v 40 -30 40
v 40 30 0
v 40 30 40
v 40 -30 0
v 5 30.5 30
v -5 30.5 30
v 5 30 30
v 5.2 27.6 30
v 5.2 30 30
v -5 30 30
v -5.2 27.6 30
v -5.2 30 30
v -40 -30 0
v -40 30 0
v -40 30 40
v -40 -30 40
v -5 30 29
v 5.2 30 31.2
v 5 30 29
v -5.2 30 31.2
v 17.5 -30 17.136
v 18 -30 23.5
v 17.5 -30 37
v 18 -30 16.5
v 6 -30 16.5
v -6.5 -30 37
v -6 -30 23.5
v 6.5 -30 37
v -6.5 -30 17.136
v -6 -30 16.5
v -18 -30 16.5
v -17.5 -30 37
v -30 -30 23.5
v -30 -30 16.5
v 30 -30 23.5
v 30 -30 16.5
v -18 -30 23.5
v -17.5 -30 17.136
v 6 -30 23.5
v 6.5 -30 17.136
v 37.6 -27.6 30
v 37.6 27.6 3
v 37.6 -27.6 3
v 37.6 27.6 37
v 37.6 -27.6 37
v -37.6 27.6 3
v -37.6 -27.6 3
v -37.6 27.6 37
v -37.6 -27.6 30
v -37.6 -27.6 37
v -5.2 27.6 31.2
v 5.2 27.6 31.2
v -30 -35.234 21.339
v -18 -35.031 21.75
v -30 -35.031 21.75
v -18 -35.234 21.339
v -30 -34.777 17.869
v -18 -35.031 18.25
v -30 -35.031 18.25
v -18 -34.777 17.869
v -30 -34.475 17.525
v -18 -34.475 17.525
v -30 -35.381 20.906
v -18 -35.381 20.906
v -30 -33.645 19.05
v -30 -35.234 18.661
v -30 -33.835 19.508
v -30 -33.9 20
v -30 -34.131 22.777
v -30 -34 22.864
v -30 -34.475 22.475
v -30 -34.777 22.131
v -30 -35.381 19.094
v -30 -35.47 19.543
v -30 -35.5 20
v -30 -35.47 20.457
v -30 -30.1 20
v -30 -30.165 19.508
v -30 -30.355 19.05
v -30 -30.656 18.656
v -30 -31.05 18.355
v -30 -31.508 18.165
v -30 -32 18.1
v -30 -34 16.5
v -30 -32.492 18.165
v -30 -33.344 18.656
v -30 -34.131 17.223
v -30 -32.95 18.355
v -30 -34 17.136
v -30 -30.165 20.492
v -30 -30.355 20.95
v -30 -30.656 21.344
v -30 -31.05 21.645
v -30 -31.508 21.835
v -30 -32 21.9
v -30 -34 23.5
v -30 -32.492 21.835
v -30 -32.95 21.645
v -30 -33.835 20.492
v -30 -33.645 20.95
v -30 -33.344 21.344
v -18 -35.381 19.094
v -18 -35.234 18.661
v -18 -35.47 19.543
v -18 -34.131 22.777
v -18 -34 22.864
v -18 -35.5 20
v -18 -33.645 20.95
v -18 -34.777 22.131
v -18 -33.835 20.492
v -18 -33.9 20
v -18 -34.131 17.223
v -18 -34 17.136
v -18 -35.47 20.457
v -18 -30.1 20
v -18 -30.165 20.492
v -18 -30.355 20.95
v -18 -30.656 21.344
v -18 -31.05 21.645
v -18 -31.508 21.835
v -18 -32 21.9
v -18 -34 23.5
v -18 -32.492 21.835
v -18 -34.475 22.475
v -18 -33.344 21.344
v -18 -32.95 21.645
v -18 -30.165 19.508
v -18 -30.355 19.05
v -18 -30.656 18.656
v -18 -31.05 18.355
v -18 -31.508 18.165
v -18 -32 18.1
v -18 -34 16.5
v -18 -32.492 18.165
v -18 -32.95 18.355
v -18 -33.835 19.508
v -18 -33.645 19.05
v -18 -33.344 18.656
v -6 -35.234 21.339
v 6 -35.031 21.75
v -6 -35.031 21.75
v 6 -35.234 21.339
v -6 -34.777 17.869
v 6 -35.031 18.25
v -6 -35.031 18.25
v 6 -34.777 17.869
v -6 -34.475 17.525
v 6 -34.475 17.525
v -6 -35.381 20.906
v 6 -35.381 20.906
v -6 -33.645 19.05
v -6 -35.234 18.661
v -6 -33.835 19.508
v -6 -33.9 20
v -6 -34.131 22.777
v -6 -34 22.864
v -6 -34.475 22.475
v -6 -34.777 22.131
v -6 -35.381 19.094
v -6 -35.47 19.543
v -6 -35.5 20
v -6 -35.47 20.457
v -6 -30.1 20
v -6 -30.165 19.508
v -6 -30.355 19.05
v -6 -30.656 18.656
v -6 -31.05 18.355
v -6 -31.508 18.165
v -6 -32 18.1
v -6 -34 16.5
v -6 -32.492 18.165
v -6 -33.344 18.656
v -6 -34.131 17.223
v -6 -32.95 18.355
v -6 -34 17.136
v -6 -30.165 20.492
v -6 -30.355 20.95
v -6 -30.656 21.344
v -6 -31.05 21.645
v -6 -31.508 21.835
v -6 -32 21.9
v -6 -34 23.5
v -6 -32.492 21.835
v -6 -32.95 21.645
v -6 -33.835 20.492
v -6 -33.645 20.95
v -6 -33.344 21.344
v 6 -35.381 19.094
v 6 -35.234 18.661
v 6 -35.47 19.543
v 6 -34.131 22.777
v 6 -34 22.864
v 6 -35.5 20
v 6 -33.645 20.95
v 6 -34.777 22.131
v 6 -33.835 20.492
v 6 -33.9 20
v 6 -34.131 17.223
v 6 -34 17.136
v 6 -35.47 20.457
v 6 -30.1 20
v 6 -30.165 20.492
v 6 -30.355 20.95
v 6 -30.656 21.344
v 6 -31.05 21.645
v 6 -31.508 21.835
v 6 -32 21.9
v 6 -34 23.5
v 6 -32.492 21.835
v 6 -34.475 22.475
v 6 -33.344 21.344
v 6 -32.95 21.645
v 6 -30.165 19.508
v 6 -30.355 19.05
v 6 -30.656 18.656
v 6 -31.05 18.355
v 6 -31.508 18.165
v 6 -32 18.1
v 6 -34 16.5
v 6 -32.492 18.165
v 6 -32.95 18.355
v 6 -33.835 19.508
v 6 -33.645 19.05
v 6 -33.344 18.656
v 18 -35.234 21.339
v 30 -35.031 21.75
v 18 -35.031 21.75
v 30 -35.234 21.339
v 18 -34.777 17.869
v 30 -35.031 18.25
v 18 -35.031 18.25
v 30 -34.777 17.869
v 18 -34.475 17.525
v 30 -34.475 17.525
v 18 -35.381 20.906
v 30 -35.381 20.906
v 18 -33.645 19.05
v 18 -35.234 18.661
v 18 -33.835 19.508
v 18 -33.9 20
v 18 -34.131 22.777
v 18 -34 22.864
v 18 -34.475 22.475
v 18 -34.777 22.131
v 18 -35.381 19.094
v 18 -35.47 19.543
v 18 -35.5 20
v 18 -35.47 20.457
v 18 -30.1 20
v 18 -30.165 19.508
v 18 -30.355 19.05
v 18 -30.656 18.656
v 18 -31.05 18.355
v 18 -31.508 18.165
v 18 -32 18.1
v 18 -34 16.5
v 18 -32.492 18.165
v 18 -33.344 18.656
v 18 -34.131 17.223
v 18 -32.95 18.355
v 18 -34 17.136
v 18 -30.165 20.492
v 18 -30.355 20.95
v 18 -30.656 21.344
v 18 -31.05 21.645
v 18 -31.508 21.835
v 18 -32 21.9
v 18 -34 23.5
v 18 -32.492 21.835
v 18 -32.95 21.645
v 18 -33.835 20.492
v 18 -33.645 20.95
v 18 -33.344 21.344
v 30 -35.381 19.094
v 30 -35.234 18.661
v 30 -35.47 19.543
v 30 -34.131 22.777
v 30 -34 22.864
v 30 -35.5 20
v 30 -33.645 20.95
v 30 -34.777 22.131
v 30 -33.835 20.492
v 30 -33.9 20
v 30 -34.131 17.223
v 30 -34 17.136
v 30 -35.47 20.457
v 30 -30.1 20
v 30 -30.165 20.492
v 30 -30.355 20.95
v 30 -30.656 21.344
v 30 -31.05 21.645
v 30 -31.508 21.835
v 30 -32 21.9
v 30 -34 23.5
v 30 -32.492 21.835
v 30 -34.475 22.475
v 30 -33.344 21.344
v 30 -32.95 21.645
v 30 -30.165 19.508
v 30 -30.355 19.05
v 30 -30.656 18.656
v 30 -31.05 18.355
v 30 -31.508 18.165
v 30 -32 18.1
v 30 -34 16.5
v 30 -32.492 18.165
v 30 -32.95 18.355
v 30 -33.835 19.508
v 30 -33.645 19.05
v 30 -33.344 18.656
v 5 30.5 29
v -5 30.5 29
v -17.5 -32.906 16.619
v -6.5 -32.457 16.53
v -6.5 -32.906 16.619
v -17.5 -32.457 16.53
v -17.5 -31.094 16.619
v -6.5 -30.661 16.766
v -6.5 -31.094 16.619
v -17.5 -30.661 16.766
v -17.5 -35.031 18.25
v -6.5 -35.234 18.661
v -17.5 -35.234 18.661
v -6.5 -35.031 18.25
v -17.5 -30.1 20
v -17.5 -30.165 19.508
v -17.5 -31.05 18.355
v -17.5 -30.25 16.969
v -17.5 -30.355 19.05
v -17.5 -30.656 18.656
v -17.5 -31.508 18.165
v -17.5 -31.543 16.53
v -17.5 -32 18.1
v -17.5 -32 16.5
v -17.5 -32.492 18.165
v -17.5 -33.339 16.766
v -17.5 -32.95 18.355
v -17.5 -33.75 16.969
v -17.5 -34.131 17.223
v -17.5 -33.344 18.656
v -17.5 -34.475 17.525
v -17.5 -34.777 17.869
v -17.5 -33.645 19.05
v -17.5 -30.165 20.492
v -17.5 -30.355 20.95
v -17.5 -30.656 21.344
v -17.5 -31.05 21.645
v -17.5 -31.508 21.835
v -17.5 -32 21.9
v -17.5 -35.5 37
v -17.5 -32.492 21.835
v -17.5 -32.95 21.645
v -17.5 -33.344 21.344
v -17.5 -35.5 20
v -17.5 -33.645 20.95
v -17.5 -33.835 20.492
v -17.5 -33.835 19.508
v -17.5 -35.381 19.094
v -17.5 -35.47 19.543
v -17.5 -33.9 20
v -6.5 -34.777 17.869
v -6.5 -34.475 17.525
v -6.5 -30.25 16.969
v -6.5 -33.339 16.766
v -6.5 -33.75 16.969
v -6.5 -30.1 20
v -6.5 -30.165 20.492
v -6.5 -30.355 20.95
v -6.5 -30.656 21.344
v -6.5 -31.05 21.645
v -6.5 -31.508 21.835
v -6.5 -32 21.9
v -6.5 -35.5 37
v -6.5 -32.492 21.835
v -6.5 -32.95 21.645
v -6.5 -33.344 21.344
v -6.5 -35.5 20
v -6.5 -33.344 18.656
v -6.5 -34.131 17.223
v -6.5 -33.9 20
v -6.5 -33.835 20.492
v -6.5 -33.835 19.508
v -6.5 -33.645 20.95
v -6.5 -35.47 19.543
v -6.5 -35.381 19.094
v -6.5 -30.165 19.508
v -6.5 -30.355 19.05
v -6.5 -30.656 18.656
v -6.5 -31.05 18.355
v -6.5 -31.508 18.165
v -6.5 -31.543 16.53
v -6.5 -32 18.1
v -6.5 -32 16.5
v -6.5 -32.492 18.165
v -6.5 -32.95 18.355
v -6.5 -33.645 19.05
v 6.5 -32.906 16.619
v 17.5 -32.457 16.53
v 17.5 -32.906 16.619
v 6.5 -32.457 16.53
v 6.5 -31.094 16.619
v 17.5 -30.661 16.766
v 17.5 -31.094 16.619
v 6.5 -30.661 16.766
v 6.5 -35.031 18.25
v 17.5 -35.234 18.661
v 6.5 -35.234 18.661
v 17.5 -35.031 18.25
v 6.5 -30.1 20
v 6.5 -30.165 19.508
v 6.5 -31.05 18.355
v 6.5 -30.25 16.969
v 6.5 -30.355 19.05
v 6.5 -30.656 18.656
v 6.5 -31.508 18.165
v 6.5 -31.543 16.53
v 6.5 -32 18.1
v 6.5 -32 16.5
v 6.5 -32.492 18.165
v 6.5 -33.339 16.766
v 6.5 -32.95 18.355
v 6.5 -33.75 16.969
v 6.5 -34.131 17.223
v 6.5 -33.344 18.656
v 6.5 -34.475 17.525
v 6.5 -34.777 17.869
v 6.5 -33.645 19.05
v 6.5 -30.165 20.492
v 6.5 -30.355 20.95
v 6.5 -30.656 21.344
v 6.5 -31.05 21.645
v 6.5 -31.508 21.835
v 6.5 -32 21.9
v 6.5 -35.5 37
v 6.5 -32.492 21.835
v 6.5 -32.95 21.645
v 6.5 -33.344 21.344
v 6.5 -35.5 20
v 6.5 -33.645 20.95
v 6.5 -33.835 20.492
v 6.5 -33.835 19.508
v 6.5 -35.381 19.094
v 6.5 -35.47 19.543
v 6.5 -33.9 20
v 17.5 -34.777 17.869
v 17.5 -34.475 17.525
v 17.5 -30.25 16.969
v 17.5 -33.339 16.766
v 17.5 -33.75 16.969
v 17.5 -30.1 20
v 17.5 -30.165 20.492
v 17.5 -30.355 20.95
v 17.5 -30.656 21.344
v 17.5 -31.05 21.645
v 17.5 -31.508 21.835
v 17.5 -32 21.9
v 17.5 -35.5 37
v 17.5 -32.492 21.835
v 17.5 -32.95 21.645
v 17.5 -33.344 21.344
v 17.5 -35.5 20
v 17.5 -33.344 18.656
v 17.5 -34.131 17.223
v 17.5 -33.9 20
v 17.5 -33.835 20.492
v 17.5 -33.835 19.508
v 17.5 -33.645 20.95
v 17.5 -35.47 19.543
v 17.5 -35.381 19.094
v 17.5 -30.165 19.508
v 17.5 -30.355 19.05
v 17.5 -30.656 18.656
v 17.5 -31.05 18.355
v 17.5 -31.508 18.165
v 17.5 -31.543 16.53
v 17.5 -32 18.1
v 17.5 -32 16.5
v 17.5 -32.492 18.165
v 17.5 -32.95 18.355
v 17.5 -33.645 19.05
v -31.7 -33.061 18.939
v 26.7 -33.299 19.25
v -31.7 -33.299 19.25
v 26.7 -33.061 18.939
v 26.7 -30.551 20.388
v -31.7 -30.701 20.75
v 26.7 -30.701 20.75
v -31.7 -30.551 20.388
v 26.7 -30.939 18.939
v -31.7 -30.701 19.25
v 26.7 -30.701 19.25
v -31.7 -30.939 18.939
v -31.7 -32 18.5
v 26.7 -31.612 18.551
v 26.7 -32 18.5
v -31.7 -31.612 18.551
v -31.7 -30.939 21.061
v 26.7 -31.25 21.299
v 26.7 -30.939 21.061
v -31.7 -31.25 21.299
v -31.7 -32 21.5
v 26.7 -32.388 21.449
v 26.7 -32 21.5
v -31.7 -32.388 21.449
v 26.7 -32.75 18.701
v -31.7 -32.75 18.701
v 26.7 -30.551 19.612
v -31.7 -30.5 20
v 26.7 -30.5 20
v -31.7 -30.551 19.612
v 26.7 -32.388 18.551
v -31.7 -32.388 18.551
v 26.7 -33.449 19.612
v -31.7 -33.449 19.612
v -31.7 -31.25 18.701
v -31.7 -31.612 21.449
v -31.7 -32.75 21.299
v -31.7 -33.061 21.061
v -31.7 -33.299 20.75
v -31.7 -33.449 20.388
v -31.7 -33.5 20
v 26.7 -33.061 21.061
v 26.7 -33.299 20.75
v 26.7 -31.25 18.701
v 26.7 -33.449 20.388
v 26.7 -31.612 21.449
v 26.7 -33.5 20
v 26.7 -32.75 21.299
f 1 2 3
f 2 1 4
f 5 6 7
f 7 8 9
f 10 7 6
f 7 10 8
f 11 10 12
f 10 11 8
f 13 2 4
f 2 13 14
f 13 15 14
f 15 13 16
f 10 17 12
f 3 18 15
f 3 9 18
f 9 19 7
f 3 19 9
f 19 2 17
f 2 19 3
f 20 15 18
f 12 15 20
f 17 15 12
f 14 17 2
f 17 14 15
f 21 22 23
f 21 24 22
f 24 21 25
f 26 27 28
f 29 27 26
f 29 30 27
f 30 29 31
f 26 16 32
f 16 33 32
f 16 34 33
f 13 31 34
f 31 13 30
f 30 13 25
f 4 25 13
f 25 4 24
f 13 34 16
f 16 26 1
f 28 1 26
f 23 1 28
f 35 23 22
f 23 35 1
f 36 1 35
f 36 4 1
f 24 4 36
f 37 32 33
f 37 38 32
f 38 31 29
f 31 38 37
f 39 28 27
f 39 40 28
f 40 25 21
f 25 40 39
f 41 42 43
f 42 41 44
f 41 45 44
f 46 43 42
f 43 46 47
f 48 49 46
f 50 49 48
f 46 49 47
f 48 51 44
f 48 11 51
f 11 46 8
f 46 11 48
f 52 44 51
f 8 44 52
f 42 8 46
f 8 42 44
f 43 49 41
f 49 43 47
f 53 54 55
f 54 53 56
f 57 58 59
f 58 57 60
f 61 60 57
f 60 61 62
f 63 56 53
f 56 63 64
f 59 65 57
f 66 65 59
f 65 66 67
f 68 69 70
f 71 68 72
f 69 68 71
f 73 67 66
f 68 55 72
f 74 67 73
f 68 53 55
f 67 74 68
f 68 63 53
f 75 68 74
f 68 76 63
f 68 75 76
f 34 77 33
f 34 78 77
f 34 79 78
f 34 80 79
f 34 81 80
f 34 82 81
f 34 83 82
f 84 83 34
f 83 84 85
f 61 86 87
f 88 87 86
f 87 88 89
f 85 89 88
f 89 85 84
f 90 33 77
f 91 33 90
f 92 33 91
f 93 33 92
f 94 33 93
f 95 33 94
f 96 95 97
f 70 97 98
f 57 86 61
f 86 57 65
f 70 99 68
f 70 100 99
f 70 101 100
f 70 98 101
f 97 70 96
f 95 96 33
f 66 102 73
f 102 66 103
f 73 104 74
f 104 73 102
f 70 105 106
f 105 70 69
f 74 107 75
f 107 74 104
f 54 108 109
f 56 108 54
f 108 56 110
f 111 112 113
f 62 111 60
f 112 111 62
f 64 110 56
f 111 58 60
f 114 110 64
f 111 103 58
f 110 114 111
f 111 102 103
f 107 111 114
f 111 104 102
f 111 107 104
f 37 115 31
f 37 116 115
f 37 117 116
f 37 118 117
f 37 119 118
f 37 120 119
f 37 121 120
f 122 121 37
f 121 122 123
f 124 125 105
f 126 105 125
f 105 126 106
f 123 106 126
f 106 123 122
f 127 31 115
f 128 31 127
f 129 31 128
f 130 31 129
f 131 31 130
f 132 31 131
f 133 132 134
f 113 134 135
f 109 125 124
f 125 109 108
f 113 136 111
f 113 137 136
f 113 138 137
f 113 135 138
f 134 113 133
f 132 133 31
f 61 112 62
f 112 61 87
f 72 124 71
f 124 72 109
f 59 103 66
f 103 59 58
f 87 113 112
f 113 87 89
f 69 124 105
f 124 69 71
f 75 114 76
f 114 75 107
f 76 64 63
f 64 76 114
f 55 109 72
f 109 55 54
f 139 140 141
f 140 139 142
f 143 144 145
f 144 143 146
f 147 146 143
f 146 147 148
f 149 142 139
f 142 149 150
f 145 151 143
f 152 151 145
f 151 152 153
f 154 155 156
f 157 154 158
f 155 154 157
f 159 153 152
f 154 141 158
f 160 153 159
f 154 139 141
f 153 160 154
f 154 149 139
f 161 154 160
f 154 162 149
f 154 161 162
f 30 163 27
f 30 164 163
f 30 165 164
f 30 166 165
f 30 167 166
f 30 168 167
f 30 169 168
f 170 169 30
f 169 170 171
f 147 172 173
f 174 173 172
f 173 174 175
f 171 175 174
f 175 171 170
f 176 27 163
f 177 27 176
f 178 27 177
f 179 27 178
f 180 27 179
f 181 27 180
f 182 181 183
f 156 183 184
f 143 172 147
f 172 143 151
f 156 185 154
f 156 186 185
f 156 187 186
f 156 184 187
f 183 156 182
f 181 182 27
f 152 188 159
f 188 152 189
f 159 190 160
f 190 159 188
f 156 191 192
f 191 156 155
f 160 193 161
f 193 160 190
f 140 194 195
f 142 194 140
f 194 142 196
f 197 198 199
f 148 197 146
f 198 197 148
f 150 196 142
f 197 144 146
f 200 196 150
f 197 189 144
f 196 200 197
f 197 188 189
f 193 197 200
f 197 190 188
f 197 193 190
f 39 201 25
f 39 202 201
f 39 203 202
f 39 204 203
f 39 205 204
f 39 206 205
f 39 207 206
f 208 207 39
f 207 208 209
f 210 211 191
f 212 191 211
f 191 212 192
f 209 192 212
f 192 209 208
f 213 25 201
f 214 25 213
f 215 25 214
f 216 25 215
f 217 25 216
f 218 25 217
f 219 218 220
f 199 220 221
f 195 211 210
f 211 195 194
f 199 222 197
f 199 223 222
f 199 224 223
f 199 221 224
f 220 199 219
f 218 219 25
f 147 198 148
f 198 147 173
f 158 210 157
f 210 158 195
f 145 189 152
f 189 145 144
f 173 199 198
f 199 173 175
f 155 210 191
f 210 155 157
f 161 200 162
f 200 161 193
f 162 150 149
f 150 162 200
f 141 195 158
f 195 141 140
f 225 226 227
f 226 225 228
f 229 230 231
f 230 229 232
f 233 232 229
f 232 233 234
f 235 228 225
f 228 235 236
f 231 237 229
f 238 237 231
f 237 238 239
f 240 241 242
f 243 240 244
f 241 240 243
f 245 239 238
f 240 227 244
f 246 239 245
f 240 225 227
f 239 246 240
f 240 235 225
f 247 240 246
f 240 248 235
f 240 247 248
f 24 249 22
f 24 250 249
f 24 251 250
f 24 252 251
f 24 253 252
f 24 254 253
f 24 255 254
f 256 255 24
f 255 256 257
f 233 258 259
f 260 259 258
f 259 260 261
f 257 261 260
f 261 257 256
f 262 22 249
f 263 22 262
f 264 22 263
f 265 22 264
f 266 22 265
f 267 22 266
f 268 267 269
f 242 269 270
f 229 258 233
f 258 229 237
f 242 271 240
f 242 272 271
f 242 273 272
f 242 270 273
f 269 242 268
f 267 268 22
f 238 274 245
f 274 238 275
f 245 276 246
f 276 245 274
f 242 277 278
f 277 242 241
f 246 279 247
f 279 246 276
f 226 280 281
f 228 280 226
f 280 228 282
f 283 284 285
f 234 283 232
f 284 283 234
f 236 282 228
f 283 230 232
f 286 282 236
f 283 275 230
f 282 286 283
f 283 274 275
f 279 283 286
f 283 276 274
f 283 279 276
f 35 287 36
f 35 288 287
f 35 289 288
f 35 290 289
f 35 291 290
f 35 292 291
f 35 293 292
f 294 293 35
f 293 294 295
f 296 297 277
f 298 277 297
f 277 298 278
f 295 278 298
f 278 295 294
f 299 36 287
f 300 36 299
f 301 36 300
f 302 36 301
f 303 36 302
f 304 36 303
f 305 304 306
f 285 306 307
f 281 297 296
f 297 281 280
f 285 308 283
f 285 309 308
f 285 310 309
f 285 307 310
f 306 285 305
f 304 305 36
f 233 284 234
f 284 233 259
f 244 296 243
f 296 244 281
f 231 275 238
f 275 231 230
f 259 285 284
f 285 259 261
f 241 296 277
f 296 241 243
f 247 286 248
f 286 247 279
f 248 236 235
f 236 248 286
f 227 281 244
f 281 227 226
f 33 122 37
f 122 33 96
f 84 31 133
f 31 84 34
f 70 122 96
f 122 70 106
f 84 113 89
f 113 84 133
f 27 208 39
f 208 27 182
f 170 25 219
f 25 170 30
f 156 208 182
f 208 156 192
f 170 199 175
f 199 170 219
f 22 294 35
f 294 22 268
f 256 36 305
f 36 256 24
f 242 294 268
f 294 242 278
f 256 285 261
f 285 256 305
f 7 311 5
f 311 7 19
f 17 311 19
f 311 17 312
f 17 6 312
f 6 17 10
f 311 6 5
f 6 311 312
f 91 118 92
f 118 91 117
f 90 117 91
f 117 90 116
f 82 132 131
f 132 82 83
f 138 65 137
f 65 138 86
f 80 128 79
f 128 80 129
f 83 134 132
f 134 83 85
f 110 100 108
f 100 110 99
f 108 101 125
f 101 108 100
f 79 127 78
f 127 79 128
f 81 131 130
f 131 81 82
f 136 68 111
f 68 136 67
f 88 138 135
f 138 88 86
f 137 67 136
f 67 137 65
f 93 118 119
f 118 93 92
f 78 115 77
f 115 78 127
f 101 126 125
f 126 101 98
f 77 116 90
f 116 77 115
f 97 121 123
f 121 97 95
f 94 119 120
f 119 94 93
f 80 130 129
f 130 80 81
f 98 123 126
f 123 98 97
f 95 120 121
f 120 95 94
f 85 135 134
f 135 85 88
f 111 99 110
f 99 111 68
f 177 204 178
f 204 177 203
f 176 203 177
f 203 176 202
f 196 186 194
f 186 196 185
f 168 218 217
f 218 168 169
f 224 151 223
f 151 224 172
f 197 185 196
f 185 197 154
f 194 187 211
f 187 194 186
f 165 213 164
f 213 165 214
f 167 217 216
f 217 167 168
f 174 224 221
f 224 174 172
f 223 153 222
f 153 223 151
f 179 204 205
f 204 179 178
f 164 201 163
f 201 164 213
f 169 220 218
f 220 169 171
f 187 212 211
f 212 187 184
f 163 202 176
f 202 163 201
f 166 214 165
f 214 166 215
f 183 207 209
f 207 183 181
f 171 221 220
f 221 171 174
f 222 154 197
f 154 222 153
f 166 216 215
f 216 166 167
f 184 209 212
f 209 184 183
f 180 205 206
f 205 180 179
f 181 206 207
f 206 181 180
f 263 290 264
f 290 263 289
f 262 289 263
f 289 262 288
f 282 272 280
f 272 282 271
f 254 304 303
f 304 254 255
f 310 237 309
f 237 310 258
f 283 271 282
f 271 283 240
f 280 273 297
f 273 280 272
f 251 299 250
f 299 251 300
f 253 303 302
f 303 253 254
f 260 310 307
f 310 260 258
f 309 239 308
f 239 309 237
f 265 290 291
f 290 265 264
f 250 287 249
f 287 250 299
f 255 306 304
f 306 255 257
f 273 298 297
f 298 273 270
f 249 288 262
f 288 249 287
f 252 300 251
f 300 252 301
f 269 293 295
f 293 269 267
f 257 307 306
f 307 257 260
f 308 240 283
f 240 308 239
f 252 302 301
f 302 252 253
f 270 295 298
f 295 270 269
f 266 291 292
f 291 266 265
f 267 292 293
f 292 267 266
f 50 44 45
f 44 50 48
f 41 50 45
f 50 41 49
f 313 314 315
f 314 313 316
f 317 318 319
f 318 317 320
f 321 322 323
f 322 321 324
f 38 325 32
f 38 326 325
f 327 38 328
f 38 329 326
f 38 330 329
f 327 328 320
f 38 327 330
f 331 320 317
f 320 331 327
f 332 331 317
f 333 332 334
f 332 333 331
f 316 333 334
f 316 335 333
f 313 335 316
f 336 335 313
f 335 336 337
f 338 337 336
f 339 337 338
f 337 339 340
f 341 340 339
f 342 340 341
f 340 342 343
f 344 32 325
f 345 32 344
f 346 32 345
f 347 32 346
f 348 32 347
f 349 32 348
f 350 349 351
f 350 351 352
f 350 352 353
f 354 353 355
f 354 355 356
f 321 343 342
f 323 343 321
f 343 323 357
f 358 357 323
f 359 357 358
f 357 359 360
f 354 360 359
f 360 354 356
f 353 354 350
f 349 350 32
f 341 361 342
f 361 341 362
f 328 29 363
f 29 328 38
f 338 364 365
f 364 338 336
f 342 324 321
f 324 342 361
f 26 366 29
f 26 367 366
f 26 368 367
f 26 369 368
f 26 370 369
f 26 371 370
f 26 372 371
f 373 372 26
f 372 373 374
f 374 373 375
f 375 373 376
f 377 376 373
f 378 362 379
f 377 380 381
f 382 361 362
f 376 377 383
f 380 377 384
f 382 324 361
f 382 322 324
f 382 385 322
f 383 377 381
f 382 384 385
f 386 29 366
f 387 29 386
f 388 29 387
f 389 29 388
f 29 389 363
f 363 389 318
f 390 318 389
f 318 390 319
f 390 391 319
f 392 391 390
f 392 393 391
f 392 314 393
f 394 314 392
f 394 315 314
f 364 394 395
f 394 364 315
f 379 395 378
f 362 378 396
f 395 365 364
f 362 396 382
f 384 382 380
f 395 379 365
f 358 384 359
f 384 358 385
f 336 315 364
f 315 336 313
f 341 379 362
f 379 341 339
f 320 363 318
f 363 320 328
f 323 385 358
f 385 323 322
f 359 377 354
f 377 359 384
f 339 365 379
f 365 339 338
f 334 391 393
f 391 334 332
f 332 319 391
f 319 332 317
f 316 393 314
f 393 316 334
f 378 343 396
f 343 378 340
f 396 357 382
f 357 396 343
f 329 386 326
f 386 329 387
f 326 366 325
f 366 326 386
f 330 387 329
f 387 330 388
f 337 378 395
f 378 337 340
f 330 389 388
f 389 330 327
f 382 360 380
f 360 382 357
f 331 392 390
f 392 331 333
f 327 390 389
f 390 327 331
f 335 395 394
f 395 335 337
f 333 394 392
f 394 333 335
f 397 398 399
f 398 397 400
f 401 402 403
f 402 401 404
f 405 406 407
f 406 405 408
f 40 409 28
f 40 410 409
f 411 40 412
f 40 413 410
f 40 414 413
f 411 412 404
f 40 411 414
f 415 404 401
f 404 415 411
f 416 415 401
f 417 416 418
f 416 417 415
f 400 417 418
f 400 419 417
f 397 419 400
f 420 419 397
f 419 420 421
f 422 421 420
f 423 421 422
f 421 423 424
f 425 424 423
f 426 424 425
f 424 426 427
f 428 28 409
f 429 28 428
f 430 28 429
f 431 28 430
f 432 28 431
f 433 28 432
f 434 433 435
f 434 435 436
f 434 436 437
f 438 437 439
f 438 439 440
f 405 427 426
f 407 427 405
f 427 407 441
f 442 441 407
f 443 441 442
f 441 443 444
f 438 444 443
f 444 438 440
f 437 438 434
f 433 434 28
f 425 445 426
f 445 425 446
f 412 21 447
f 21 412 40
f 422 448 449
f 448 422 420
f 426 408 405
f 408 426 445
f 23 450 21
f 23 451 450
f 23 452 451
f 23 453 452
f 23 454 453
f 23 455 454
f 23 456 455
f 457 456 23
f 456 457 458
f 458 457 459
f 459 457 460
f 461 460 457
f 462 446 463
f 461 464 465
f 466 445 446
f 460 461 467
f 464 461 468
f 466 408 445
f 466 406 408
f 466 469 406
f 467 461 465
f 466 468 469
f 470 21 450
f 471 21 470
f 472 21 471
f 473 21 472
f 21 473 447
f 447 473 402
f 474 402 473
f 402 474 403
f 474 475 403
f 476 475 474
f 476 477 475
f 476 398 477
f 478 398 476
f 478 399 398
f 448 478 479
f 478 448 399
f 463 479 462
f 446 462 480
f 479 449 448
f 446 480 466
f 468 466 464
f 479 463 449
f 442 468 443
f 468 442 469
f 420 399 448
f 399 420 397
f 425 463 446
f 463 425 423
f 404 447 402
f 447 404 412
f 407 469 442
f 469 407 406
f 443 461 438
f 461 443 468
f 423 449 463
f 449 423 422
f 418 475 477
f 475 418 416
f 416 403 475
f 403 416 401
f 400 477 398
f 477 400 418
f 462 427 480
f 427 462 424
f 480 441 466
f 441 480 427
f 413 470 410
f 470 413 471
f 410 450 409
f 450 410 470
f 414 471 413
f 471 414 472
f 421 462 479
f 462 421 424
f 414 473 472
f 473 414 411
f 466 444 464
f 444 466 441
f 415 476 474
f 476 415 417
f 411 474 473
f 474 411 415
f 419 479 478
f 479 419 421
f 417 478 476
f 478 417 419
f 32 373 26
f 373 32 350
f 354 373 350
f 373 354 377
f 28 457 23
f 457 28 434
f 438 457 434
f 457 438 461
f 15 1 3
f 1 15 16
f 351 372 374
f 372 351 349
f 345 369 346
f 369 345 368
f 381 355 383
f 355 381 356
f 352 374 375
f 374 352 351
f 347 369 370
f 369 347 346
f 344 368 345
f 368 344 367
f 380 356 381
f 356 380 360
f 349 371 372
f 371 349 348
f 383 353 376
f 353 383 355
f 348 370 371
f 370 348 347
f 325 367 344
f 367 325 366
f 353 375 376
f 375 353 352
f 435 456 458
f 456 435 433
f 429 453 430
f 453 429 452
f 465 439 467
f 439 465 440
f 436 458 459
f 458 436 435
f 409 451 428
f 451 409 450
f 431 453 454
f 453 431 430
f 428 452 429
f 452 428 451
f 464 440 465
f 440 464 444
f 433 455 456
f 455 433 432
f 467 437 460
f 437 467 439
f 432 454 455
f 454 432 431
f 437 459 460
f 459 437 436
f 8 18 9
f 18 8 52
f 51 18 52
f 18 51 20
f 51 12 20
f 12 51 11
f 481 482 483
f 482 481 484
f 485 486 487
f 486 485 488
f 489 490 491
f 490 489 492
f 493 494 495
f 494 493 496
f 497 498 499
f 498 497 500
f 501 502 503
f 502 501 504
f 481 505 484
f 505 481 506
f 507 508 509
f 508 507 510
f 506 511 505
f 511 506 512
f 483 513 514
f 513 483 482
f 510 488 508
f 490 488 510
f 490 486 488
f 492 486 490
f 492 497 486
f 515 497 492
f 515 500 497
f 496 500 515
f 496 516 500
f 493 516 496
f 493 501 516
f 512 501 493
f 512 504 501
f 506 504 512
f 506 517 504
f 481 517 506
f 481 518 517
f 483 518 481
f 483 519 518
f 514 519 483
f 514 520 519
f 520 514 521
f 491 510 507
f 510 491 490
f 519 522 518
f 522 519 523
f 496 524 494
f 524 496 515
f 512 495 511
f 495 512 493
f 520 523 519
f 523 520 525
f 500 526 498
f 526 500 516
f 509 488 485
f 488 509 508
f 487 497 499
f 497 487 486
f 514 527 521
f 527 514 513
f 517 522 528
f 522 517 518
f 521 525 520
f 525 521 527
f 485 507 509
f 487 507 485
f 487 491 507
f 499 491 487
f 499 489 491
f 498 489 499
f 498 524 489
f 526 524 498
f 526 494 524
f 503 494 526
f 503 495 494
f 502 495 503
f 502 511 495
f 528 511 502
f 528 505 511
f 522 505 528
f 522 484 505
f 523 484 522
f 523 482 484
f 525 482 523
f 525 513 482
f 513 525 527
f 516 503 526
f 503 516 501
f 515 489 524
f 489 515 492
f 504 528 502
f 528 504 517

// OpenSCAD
part = "assembly"; // [base, lid, pin, assembly]
cadverify_only = "";
module instance(name, part, unit = 1) {
  echo(cadverify_instance = [name, part, unit]);
  if (cadverify_only == "" || cadverify_only == name) children();
}
Bx=80; By=60; Hb=30; Lt=3; Sk=7; Wt=2.4; Bt=3;
Ya=-32; Za=20; Kr=3.5; Br=1.9; Pr=1.5;
module barrel(x0,x1) {
  difference() {
    translate([0,Ya,Za]) rotate([0,90,0]) translate([0,0,(x0+x1)/2])
      cylinder(h=x1-x0, r=Kr, center=true, $fn=48);
    translate([0,Ya,Za]) rotate([0,90,0]) translate([0,0,(x0+x1)/2])
      cylinder(h=(x1-x0)+0.8, r=Br, center=true, $fn=24);
  }
}
module base_geom() {
  difference() {
    union() {
      difference() {
        translate([-40,-30,0]) cube([80,60,30]);
        translate([-37.6,-27.6,3]) cube([75.2,55.2,27.01]);
      }
      for (b=[[-30,-18],[-6,6],[18,30]]) {
        translate([b[0],-34,16.5]) cube([b[1]-b[0],5.5,7.0]);
        barrel(b[0],b[1]);
      }
      translate([-5,29.0,29.0]) cube([10,1.5,1.0]);
    }
    for (b=[[-30,-18],[-6,6],[18,30]])
      translate([0,Ya,Za]) rotate([0,90,0]) translate([0,0,(b[0]+b[1])/2])
        cylinder(h=(b[1]-b[0])+0.8, r=Br, center=true, $fn=24);
  }
}
module lid_open() {
  difference() {
    union() {
      translate([-40,-94,0]) cube([80,60,3]);
      difference() {
        translate([-40,-94,3]) cube([80,60,7]);
        translate([-37.6,-91.6,3]) cube([75.2,55.2,7.01]);
      }
      for (b=[[-17.5,-6.5],[6.5,17.5]]) {
        translate([b[0],-34,3]) cube([b[1]-b[0],5.5,17.0]);
        barrel(b[0],b[1]);
      }
    }
    translate([-5.2,-94.1,8.8]) cube([10.4,2.6,1.3]);
    for (b=[[-17.5,-6.5],[6.5,17.5]])
      translate([0,Ya,Za]) rotate([0,90,0]) translate([0,0,(b[0]+b[1])/2])
        cylinder(h=(b[1]-b[0])+0.8, r=Br, center=true, $fn=24);
  }
}
module pin_vert() {
  translate([0,0,0.8]) cylinder(h=58.4, r=Pr, center=false, $fn=24);
}
module lid_closed() {
  translate([0,Ya,Za]) rotate([180,0,0]) translate([0,-Ya,-Za]) lid_open();
}
module pin_placed() {
  translate([0,Ya,Za]) rotate([0,90,0]) translate([0,0,-32.5]) pin_vert();
}
if (part=="base") {
  base_geom();
  echo(cadverify_spec=[
    ["bounds", [[-40,-35.5,0],[40,30.5,30]]],
    ["bodies", 1],
    ["support_faces", [["base","-z",4000]]],
    ["overhangs_allowed", [["hinge", [[-30,-35.5,14],[30,-28.5,24]]]]],
    ["copies", 1],
    ["details", [
      ["bottom","thickness",[0,0,-1],[0,0,1],3],
      ["cavity","void",[[-37.6,-27.6,3],[37.6,27.6,30]],0.9],
      ["knuckle","material",[[-30,-35.5,16.5],[-18,-28.5,23.5]],0.5],
      ["bore","hole",[-31,-32,20],[1,0,0],[[0,3.8],[10,3.8]]],
      ["catch","material",[[-5,29,29],[5,30.5,30]],0.8]
    ]]
  ]);
} else if (part=="lid") {
  lid_open();
  echo(cadverify_spec=[
    ["bounds", [[-40,-94,0],[40,-28.5,23.5]]],
    ["bodies", 1],
    ["support_faces", [["lid","-z",4000]]],
    ["overhangs_allowed", [["hinge", [[-17.5,-35.5,14],[17.5,-28.5,24]]]]],
    ["copies", 1],
    ["details", [
      ["plate","thickness",[0,-64,-1],[0,0,1],3],
      ["pocket","void",[[-37.6,-91.6,3],[37.6,-36.4,10]],0.9],
      ["knuckle","material",[[-17.5,-35.5,16.5],[-6.5,-28.5,23.5]],0.5],
      ["bore","hole",[-18,-32,20],[1,0,0],[[0,3.8],[9,3.8]]],
      ["notch","void",[[-5.2,-94.1,8.8],[5.2,-91.5,10.1]],0.9]
    ]]
  ]);
} else if (part=="pin") {
  pin_vert();
  echo(cadverify_spec=[
    ["bounds", [[-1.5,-1.5,0.8],[1.5,1.5,59.2]]],
    ["bodies", 1],
    ["support_faces", [["pin","-z",5]]],
    ["overhangs_allowed", []],
    ["copies", 1],
    ["details", [
      ["shaft","thickness",[5,0,32],[-1,0,0],3]
    ]]
  ]);
} else {
  instance("base","base") base_geom();
  instance("lid","lid") lid_closed();
  instance("pin","pin") pin_placed();
  echo(cadverify_spec=[
    ["bounds", [[-40,-35.5,0],[40,30.5,40]]],
    ["support_faces", [["bed","-z",4000]]],
    ["motions", [["swing",["lid"],"rotate",[0,-32,20],[1,0,0],[0,180]]]],
    ["assembly_order", [[["base"],[0,0,0]],[["lid"],[0,0,1]],[["pin"],[-1,0,0]]]],
    ["print_in_place", 0.4],
    ["print_pose", [["swing",180]]],
    ["overhangs_allowed", [["hinge", [[-30,-35.5,14],[30,-28.5,24]]]]]
  ]);
}
